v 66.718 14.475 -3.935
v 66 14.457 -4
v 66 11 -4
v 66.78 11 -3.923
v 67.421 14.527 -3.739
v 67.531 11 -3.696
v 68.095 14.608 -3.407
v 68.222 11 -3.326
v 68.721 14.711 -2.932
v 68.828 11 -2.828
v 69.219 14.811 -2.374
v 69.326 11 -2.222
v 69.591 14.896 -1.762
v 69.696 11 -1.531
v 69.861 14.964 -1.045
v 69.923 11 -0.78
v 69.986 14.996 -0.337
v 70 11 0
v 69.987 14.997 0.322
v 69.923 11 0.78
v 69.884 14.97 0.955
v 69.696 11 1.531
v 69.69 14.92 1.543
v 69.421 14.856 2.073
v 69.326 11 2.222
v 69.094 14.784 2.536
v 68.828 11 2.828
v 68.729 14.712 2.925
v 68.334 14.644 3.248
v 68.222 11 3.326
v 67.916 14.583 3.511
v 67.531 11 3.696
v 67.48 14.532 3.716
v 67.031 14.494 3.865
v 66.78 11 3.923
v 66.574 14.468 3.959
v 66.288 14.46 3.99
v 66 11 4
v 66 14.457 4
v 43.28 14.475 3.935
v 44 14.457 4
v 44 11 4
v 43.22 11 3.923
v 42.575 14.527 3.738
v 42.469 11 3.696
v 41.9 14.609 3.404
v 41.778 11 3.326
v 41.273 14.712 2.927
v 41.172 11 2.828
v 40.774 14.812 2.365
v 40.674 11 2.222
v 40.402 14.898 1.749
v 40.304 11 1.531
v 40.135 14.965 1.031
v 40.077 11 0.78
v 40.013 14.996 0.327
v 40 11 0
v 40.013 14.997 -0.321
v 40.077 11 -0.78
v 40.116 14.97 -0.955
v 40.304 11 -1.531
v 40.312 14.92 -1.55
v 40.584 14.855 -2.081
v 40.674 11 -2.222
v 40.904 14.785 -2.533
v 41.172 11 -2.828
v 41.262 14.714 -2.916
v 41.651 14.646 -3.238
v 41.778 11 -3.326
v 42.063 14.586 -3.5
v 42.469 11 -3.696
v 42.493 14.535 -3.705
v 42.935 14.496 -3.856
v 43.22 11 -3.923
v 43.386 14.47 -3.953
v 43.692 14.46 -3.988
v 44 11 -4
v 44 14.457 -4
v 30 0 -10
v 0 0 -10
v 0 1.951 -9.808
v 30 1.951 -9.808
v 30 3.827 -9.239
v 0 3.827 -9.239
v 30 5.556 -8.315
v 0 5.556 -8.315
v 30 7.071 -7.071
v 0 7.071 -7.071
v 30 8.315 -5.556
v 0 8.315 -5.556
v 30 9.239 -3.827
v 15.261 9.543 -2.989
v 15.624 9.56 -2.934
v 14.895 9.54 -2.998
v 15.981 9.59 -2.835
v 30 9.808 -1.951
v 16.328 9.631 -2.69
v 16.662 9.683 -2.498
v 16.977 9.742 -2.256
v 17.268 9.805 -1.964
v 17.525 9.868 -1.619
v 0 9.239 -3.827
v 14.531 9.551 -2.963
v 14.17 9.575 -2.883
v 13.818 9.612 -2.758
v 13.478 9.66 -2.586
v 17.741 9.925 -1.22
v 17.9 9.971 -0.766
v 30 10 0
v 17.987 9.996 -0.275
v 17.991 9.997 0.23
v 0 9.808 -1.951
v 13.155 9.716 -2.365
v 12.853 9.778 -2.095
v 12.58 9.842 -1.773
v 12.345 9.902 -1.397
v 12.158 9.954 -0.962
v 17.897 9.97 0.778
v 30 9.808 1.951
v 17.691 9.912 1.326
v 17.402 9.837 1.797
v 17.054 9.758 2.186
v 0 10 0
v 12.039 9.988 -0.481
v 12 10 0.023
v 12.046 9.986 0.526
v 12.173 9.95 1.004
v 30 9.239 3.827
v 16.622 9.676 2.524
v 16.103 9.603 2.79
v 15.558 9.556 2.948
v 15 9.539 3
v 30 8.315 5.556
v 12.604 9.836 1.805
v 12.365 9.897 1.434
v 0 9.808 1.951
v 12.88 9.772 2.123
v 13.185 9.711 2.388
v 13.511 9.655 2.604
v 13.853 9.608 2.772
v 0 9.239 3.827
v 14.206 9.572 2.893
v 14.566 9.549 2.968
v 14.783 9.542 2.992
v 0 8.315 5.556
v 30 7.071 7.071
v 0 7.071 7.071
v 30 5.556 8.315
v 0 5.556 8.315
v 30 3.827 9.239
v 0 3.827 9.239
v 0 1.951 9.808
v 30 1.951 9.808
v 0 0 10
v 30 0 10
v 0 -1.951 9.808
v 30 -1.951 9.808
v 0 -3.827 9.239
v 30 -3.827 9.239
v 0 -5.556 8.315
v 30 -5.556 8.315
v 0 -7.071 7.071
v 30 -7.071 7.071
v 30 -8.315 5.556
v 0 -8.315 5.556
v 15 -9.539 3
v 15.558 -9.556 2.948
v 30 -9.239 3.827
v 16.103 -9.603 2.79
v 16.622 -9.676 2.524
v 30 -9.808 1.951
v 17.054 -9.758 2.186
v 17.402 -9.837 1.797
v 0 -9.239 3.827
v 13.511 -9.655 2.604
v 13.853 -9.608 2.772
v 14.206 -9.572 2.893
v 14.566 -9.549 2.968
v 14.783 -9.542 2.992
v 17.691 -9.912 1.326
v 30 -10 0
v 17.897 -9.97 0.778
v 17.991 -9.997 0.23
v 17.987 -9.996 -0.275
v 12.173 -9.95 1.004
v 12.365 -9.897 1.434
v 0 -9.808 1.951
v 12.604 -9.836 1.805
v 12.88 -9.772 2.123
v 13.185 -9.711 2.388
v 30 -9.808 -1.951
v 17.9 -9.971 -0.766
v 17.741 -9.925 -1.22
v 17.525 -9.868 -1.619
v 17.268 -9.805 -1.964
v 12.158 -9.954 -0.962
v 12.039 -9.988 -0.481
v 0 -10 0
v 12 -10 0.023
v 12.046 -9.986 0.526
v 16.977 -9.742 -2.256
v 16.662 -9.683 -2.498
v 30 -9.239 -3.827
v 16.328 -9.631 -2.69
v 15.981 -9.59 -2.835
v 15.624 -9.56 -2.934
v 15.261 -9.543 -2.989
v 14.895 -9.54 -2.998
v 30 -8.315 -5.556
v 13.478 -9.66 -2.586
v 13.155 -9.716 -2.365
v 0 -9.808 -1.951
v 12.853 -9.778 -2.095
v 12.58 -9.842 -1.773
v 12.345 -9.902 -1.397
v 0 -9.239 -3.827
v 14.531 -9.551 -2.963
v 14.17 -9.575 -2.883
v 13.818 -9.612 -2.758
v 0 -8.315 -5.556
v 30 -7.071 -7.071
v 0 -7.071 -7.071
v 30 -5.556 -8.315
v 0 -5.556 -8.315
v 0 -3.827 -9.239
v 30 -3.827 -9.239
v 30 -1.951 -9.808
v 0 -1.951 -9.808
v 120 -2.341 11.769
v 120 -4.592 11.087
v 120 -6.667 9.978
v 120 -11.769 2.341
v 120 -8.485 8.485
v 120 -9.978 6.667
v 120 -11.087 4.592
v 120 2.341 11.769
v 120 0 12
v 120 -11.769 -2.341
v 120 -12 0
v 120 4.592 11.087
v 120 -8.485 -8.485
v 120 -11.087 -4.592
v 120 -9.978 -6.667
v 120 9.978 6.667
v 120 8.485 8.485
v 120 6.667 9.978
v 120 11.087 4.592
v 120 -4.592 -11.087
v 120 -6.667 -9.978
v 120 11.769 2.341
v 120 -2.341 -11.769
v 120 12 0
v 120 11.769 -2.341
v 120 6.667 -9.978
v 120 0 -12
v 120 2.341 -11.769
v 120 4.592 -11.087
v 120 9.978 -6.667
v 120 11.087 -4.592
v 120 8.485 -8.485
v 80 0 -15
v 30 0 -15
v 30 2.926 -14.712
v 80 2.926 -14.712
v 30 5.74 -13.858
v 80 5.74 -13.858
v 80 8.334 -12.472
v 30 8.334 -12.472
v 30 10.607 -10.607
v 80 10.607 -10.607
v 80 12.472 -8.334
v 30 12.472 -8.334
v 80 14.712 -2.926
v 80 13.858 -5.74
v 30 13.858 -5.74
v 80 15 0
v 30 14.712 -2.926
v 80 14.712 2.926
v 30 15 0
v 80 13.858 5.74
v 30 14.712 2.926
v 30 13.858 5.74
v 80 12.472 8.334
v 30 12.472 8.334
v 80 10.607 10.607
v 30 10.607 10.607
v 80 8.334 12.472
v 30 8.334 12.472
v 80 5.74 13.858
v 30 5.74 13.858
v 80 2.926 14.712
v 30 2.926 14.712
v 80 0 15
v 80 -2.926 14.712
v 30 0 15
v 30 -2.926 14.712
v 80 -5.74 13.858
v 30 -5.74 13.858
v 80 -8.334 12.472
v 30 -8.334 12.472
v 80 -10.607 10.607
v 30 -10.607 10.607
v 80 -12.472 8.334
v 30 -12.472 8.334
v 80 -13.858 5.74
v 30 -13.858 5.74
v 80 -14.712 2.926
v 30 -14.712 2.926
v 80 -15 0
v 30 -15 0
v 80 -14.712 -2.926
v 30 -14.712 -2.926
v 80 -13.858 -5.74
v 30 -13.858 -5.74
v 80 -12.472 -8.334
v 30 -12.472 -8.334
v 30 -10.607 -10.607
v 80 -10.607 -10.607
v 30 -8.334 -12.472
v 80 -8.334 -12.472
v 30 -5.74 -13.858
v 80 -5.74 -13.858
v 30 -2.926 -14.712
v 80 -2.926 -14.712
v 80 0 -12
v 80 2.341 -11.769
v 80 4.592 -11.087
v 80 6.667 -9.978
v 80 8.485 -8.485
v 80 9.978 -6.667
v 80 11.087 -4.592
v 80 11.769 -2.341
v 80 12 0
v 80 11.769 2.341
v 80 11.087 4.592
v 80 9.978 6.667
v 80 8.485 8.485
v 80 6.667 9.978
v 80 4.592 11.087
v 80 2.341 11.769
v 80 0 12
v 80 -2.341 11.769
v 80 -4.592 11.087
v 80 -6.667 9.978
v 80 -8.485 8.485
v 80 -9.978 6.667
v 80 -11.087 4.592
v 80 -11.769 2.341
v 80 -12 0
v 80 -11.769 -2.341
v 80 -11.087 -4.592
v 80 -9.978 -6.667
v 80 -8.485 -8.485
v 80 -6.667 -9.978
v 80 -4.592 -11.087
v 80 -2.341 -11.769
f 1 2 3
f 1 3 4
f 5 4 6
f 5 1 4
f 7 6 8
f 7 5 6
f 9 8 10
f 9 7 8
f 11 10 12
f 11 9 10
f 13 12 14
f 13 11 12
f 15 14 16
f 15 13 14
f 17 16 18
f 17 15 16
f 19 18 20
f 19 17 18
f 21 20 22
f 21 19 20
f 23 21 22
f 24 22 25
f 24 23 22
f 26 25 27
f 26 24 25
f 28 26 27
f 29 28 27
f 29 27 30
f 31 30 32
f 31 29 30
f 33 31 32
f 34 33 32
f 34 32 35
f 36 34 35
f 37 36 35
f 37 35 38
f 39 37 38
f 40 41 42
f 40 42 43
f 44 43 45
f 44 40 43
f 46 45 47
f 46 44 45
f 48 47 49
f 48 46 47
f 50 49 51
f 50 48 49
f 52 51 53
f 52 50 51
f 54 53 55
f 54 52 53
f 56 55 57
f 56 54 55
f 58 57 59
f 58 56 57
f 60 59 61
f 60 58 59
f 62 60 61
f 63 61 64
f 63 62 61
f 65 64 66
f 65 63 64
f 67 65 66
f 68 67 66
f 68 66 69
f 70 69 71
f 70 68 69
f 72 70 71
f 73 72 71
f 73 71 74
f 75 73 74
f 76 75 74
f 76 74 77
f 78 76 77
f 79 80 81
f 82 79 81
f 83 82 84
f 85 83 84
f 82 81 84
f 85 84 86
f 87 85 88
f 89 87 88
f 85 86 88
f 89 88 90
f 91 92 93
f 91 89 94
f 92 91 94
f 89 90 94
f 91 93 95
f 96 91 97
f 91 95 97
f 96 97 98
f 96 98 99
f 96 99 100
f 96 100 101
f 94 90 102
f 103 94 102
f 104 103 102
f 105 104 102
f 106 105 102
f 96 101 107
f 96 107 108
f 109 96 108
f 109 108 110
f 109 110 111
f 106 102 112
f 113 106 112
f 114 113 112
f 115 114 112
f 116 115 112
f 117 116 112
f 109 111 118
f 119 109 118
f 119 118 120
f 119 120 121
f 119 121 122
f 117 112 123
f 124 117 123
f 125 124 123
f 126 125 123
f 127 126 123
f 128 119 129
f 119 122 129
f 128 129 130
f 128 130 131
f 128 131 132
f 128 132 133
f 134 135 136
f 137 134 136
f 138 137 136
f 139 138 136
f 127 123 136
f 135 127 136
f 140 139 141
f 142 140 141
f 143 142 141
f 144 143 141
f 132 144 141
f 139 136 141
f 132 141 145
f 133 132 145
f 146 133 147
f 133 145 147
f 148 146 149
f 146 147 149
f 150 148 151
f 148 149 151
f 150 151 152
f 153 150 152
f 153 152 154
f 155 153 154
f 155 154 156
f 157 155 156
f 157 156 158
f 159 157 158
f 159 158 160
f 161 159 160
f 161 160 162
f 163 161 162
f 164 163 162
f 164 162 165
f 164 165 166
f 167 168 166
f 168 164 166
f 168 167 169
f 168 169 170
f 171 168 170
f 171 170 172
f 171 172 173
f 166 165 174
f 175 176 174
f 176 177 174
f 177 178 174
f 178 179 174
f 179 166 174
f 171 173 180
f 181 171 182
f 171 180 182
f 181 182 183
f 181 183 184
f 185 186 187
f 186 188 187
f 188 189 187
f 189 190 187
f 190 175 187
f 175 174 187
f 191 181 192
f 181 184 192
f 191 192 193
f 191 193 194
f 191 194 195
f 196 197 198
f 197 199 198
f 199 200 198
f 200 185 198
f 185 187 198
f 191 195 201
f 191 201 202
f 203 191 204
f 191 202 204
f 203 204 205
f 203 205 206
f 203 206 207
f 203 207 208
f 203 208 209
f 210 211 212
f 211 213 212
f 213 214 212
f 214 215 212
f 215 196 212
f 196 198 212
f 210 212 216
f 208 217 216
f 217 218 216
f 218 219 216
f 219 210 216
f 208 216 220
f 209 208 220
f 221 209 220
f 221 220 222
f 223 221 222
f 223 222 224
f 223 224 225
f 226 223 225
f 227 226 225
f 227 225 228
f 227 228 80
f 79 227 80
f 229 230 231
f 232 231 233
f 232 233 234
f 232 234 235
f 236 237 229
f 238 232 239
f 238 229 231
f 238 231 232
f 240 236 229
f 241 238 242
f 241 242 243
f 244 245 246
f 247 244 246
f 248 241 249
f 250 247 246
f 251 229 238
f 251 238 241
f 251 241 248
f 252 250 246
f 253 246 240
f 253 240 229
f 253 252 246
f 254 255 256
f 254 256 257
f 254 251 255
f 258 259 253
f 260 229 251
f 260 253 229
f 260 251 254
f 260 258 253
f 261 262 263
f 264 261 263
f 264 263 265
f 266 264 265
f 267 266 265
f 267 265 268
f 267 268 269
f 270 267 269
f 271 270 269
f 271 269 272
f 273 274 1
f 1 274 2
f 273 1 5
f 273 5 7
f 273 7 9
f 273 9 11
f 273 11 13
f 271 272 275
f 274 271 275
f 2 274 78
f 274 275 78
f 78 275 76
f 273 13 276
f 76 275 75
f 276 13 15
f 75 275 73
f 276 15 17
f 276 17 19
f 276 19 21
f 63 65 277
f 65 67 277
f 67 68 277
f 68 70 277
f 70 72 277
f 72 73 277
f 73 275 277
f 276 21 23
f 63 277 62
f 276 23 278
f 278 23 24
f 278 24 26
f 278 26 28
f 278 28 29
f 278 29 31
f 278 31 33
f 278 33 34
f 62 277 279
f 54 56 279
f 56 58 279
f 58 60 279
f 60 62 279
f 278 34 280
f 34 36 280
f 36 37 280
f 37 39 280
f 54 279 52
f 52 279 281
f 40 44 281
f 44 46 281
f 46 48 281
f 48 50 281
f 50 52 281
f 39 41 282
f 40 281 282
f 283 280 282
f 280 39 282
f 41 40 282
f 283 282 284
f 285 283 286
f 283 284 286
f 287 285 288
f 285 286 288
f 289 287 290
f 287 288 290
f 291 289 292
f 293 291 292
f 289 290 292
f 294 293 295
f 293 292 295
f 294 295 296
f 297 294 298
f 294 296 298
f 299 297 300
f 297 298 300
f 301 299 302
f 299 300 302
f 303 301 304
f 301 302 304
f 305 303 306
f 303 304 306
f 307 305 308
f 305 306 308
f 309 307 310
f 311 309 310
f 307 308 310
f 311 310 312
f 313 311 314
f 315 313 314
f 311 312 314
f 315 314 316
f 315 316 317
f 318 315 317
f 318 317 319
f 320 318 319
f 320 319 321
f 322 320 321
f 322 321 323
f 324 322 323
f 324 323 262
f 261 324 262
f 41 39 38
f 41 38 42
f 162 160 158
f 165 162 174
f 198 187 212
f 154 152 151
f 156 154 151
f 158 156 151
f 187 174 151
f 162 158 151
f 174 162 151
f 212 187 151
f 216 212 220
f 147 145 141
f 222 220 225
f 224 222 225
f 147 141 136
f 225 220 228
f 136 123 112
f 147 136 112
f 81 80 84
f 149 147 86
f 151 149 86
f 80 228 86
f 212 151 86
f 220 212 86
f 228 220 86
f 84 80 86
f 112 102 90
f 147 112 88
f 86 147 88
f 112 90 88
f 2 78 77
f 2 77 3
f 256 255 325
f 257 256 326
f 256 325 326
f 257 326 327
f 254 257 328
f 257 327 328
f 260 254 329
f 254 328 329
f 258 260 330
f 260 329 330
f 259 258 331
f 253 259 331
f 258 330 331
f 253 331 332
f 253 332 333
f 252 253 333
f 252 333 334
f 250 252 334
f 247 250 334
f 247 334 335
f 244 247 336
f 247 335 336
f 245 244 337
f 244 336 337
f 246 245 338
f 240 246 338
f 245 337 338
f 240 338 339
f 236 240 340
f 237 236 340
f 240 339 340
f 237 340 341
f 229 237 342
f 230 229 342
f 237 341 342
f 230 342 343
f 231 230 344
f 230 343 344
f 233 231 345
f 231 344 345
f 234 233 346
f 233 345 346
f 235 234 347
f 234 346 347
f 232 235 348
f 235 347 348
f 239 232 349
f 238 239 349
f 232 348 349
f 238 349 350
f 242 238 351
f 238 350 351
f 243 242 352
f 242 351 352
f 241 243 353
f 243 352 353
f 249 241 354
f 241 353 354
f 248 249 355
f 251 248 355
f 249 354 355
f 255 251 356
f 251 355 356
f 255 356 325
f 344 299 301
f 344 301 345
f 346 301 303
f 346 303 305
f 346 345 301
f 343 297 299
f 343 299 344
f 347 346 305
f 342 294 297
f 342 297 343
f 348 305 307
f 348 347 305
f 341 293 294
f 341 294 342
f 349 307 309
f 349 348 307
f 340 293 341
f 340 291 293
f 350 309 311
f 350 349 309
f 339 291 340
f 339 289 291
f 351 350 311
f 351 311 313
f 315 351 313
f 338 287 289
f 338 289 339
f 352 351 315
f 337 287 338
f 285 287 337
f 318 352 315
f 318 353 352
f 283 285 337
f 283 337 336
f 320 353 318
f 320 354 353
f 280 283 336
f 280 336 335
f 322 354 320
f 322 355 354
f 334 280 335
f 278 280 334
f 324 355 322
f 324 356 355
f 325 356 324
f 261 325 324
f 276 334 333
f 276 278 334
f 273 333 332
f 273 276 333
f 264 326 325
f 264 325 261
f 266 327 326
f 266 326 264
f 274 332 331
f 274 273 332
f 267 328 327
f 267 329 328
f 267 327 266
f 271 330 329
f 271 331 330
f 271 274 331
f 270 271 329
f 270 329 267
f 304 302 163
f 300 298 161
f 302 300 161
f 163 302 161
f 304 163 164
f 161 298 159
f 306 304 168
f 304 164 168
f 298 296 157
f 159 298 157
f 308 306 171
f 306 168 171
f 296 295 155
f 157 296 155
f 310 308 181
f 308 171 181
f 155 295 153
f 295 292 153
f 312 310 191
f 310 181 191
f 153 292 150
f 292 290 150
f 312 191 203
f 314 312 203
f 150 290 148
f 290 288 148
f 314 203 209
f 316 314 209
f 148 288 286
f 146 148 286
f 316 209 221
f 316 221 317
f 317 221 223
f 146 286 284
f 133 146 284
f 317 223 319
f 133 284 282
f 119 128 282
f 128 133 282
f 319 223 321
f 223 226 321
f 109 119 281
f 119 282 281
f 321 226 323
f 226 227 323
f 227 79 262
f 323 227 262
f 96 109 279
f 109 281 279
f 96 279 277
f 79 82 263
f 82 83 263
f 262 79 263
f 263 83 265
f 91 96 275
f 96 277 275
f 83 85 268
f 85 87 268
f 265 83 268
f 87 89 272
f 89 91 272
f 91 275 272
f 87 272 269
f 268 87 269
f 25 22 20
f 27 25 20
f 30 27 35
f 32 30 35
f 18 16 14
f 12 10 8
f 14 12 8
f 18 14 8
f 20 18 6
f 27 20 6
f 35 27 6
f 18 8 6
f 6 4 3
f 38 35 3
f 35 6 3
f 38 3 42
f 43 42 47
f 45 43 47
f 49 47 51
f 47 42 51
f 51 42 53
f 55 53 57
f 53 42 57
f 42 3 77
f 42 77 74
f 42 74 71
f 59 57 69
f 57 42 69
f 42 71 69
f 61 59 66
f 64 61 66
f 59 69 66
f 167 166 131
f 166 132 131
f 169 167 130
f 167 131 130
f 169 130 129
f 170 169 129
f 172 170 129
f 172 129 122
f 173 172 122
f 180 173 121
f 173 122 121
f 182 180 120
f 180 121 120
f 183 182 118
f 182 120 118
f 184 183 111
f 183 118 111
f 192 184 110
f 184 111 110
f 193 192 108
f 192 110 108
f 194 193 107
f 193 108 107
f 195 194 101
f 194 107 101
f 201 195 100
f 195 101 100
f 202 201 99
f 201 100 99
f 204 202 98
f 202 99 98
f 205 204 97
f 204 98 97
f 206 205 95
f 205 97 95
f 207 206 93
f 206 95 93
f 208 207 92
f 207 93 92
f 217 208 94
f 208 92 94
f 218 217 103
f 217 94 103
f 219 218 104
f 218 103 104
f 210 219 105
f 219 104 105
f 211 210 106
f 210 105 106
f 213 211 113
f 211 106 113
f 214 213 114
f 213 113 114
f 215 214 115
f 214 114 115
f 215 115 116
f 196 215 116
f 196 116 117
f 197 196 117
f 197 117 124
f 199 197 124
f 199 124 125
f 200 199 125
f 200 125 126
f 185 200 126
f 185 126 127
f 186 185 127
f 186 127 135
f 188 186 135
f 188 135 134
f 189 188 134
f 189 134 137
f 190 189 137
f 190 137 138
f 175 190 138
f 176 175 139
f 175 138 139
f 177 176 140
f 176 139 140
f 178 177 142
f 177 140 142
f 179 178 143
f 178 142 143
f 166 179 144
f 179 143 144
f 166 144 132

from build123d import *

# Parameters (mm, degrees)
SKETCH_1_R          = 10
EXTRUDE_1_DEPTH     = 30
SKETCH_2_R          = 15
EXTRUDE_2_DEPTH     = 50
SKETCH_3_R          = 12
EXTRUDE_3_DEPTH     = 40
CUT_EXTRUDE_1_DEPTH = 4
SKETCH_5_R          = 3
CUT_EXTRUDE_2_DEPTH = 121


with BuildPart() as part:
    # 草图1 → 凸台-拉伸1 (new body)
    with BuildSketch(Plane(origin=(0, 0, 0), x_dir=(0, 0, -1), z_dir=(1, 0, 0))):
        Circle(SKETCH_1_R)
    extrude(amount=EXTRUDE_1_DEPTH)

    # 草图2 → 凸台-拉伸2 (add)
    with BuildSketch(Plane(origin=(30, 0, 0), x_dir=(0, 0, -1), z_dir=(1, 0, 0))):
        Circle(SKETCH_2_R)
    extrude(amount=EXTRUDE_2_DEPTH)

    # 草图3 → 凸台-拉伸3 (add)
    with BuildSketch(Plane(origin=(80, 0, 0), x_dir=(0, 0, -1), z_dir=(1, 0, 0))):
        Circle(SKETCH_3_R)
    extrude(amount=EXTRUDE_3_DEPTH)

    # 草图4 → 切除-拉伸1 (cut)
    with BuildSketch(Plane(origin=(0, 15, 0), x_dir=(1, 0, 0), z_dir=(0, 1, 0))):
        with BuildLine():
            Line((44, 4), (66, 4))
            ThreePointArc((66, 4), (70, 0), (66, -4))
            Line((66, -4), (44, -4))
            ThreePointArc((44, -4), (40, 0), (44, 4))
        make_face()
    extrude(amount=-CUT_EXTRUDE_1_DEPTH, mode=Mode.SUBTRACT)

    # 草图5 → 切除-拉伸2 (cut, symmetric)
    with BuildSketch(Plane(origin=(0, 0, 0), x_dir=(1, 0, 0), z_dir=(0, 1, 0))):
        with Locations(Location((15, 0, 0), (0, 0, 270))):
            Circle(SKETCH_5_R)
    extrude(amount=CUT_EXTRUDE_2_DEPTH, both=True, mode=Mode.SUBTRACT)


solid = part.part
